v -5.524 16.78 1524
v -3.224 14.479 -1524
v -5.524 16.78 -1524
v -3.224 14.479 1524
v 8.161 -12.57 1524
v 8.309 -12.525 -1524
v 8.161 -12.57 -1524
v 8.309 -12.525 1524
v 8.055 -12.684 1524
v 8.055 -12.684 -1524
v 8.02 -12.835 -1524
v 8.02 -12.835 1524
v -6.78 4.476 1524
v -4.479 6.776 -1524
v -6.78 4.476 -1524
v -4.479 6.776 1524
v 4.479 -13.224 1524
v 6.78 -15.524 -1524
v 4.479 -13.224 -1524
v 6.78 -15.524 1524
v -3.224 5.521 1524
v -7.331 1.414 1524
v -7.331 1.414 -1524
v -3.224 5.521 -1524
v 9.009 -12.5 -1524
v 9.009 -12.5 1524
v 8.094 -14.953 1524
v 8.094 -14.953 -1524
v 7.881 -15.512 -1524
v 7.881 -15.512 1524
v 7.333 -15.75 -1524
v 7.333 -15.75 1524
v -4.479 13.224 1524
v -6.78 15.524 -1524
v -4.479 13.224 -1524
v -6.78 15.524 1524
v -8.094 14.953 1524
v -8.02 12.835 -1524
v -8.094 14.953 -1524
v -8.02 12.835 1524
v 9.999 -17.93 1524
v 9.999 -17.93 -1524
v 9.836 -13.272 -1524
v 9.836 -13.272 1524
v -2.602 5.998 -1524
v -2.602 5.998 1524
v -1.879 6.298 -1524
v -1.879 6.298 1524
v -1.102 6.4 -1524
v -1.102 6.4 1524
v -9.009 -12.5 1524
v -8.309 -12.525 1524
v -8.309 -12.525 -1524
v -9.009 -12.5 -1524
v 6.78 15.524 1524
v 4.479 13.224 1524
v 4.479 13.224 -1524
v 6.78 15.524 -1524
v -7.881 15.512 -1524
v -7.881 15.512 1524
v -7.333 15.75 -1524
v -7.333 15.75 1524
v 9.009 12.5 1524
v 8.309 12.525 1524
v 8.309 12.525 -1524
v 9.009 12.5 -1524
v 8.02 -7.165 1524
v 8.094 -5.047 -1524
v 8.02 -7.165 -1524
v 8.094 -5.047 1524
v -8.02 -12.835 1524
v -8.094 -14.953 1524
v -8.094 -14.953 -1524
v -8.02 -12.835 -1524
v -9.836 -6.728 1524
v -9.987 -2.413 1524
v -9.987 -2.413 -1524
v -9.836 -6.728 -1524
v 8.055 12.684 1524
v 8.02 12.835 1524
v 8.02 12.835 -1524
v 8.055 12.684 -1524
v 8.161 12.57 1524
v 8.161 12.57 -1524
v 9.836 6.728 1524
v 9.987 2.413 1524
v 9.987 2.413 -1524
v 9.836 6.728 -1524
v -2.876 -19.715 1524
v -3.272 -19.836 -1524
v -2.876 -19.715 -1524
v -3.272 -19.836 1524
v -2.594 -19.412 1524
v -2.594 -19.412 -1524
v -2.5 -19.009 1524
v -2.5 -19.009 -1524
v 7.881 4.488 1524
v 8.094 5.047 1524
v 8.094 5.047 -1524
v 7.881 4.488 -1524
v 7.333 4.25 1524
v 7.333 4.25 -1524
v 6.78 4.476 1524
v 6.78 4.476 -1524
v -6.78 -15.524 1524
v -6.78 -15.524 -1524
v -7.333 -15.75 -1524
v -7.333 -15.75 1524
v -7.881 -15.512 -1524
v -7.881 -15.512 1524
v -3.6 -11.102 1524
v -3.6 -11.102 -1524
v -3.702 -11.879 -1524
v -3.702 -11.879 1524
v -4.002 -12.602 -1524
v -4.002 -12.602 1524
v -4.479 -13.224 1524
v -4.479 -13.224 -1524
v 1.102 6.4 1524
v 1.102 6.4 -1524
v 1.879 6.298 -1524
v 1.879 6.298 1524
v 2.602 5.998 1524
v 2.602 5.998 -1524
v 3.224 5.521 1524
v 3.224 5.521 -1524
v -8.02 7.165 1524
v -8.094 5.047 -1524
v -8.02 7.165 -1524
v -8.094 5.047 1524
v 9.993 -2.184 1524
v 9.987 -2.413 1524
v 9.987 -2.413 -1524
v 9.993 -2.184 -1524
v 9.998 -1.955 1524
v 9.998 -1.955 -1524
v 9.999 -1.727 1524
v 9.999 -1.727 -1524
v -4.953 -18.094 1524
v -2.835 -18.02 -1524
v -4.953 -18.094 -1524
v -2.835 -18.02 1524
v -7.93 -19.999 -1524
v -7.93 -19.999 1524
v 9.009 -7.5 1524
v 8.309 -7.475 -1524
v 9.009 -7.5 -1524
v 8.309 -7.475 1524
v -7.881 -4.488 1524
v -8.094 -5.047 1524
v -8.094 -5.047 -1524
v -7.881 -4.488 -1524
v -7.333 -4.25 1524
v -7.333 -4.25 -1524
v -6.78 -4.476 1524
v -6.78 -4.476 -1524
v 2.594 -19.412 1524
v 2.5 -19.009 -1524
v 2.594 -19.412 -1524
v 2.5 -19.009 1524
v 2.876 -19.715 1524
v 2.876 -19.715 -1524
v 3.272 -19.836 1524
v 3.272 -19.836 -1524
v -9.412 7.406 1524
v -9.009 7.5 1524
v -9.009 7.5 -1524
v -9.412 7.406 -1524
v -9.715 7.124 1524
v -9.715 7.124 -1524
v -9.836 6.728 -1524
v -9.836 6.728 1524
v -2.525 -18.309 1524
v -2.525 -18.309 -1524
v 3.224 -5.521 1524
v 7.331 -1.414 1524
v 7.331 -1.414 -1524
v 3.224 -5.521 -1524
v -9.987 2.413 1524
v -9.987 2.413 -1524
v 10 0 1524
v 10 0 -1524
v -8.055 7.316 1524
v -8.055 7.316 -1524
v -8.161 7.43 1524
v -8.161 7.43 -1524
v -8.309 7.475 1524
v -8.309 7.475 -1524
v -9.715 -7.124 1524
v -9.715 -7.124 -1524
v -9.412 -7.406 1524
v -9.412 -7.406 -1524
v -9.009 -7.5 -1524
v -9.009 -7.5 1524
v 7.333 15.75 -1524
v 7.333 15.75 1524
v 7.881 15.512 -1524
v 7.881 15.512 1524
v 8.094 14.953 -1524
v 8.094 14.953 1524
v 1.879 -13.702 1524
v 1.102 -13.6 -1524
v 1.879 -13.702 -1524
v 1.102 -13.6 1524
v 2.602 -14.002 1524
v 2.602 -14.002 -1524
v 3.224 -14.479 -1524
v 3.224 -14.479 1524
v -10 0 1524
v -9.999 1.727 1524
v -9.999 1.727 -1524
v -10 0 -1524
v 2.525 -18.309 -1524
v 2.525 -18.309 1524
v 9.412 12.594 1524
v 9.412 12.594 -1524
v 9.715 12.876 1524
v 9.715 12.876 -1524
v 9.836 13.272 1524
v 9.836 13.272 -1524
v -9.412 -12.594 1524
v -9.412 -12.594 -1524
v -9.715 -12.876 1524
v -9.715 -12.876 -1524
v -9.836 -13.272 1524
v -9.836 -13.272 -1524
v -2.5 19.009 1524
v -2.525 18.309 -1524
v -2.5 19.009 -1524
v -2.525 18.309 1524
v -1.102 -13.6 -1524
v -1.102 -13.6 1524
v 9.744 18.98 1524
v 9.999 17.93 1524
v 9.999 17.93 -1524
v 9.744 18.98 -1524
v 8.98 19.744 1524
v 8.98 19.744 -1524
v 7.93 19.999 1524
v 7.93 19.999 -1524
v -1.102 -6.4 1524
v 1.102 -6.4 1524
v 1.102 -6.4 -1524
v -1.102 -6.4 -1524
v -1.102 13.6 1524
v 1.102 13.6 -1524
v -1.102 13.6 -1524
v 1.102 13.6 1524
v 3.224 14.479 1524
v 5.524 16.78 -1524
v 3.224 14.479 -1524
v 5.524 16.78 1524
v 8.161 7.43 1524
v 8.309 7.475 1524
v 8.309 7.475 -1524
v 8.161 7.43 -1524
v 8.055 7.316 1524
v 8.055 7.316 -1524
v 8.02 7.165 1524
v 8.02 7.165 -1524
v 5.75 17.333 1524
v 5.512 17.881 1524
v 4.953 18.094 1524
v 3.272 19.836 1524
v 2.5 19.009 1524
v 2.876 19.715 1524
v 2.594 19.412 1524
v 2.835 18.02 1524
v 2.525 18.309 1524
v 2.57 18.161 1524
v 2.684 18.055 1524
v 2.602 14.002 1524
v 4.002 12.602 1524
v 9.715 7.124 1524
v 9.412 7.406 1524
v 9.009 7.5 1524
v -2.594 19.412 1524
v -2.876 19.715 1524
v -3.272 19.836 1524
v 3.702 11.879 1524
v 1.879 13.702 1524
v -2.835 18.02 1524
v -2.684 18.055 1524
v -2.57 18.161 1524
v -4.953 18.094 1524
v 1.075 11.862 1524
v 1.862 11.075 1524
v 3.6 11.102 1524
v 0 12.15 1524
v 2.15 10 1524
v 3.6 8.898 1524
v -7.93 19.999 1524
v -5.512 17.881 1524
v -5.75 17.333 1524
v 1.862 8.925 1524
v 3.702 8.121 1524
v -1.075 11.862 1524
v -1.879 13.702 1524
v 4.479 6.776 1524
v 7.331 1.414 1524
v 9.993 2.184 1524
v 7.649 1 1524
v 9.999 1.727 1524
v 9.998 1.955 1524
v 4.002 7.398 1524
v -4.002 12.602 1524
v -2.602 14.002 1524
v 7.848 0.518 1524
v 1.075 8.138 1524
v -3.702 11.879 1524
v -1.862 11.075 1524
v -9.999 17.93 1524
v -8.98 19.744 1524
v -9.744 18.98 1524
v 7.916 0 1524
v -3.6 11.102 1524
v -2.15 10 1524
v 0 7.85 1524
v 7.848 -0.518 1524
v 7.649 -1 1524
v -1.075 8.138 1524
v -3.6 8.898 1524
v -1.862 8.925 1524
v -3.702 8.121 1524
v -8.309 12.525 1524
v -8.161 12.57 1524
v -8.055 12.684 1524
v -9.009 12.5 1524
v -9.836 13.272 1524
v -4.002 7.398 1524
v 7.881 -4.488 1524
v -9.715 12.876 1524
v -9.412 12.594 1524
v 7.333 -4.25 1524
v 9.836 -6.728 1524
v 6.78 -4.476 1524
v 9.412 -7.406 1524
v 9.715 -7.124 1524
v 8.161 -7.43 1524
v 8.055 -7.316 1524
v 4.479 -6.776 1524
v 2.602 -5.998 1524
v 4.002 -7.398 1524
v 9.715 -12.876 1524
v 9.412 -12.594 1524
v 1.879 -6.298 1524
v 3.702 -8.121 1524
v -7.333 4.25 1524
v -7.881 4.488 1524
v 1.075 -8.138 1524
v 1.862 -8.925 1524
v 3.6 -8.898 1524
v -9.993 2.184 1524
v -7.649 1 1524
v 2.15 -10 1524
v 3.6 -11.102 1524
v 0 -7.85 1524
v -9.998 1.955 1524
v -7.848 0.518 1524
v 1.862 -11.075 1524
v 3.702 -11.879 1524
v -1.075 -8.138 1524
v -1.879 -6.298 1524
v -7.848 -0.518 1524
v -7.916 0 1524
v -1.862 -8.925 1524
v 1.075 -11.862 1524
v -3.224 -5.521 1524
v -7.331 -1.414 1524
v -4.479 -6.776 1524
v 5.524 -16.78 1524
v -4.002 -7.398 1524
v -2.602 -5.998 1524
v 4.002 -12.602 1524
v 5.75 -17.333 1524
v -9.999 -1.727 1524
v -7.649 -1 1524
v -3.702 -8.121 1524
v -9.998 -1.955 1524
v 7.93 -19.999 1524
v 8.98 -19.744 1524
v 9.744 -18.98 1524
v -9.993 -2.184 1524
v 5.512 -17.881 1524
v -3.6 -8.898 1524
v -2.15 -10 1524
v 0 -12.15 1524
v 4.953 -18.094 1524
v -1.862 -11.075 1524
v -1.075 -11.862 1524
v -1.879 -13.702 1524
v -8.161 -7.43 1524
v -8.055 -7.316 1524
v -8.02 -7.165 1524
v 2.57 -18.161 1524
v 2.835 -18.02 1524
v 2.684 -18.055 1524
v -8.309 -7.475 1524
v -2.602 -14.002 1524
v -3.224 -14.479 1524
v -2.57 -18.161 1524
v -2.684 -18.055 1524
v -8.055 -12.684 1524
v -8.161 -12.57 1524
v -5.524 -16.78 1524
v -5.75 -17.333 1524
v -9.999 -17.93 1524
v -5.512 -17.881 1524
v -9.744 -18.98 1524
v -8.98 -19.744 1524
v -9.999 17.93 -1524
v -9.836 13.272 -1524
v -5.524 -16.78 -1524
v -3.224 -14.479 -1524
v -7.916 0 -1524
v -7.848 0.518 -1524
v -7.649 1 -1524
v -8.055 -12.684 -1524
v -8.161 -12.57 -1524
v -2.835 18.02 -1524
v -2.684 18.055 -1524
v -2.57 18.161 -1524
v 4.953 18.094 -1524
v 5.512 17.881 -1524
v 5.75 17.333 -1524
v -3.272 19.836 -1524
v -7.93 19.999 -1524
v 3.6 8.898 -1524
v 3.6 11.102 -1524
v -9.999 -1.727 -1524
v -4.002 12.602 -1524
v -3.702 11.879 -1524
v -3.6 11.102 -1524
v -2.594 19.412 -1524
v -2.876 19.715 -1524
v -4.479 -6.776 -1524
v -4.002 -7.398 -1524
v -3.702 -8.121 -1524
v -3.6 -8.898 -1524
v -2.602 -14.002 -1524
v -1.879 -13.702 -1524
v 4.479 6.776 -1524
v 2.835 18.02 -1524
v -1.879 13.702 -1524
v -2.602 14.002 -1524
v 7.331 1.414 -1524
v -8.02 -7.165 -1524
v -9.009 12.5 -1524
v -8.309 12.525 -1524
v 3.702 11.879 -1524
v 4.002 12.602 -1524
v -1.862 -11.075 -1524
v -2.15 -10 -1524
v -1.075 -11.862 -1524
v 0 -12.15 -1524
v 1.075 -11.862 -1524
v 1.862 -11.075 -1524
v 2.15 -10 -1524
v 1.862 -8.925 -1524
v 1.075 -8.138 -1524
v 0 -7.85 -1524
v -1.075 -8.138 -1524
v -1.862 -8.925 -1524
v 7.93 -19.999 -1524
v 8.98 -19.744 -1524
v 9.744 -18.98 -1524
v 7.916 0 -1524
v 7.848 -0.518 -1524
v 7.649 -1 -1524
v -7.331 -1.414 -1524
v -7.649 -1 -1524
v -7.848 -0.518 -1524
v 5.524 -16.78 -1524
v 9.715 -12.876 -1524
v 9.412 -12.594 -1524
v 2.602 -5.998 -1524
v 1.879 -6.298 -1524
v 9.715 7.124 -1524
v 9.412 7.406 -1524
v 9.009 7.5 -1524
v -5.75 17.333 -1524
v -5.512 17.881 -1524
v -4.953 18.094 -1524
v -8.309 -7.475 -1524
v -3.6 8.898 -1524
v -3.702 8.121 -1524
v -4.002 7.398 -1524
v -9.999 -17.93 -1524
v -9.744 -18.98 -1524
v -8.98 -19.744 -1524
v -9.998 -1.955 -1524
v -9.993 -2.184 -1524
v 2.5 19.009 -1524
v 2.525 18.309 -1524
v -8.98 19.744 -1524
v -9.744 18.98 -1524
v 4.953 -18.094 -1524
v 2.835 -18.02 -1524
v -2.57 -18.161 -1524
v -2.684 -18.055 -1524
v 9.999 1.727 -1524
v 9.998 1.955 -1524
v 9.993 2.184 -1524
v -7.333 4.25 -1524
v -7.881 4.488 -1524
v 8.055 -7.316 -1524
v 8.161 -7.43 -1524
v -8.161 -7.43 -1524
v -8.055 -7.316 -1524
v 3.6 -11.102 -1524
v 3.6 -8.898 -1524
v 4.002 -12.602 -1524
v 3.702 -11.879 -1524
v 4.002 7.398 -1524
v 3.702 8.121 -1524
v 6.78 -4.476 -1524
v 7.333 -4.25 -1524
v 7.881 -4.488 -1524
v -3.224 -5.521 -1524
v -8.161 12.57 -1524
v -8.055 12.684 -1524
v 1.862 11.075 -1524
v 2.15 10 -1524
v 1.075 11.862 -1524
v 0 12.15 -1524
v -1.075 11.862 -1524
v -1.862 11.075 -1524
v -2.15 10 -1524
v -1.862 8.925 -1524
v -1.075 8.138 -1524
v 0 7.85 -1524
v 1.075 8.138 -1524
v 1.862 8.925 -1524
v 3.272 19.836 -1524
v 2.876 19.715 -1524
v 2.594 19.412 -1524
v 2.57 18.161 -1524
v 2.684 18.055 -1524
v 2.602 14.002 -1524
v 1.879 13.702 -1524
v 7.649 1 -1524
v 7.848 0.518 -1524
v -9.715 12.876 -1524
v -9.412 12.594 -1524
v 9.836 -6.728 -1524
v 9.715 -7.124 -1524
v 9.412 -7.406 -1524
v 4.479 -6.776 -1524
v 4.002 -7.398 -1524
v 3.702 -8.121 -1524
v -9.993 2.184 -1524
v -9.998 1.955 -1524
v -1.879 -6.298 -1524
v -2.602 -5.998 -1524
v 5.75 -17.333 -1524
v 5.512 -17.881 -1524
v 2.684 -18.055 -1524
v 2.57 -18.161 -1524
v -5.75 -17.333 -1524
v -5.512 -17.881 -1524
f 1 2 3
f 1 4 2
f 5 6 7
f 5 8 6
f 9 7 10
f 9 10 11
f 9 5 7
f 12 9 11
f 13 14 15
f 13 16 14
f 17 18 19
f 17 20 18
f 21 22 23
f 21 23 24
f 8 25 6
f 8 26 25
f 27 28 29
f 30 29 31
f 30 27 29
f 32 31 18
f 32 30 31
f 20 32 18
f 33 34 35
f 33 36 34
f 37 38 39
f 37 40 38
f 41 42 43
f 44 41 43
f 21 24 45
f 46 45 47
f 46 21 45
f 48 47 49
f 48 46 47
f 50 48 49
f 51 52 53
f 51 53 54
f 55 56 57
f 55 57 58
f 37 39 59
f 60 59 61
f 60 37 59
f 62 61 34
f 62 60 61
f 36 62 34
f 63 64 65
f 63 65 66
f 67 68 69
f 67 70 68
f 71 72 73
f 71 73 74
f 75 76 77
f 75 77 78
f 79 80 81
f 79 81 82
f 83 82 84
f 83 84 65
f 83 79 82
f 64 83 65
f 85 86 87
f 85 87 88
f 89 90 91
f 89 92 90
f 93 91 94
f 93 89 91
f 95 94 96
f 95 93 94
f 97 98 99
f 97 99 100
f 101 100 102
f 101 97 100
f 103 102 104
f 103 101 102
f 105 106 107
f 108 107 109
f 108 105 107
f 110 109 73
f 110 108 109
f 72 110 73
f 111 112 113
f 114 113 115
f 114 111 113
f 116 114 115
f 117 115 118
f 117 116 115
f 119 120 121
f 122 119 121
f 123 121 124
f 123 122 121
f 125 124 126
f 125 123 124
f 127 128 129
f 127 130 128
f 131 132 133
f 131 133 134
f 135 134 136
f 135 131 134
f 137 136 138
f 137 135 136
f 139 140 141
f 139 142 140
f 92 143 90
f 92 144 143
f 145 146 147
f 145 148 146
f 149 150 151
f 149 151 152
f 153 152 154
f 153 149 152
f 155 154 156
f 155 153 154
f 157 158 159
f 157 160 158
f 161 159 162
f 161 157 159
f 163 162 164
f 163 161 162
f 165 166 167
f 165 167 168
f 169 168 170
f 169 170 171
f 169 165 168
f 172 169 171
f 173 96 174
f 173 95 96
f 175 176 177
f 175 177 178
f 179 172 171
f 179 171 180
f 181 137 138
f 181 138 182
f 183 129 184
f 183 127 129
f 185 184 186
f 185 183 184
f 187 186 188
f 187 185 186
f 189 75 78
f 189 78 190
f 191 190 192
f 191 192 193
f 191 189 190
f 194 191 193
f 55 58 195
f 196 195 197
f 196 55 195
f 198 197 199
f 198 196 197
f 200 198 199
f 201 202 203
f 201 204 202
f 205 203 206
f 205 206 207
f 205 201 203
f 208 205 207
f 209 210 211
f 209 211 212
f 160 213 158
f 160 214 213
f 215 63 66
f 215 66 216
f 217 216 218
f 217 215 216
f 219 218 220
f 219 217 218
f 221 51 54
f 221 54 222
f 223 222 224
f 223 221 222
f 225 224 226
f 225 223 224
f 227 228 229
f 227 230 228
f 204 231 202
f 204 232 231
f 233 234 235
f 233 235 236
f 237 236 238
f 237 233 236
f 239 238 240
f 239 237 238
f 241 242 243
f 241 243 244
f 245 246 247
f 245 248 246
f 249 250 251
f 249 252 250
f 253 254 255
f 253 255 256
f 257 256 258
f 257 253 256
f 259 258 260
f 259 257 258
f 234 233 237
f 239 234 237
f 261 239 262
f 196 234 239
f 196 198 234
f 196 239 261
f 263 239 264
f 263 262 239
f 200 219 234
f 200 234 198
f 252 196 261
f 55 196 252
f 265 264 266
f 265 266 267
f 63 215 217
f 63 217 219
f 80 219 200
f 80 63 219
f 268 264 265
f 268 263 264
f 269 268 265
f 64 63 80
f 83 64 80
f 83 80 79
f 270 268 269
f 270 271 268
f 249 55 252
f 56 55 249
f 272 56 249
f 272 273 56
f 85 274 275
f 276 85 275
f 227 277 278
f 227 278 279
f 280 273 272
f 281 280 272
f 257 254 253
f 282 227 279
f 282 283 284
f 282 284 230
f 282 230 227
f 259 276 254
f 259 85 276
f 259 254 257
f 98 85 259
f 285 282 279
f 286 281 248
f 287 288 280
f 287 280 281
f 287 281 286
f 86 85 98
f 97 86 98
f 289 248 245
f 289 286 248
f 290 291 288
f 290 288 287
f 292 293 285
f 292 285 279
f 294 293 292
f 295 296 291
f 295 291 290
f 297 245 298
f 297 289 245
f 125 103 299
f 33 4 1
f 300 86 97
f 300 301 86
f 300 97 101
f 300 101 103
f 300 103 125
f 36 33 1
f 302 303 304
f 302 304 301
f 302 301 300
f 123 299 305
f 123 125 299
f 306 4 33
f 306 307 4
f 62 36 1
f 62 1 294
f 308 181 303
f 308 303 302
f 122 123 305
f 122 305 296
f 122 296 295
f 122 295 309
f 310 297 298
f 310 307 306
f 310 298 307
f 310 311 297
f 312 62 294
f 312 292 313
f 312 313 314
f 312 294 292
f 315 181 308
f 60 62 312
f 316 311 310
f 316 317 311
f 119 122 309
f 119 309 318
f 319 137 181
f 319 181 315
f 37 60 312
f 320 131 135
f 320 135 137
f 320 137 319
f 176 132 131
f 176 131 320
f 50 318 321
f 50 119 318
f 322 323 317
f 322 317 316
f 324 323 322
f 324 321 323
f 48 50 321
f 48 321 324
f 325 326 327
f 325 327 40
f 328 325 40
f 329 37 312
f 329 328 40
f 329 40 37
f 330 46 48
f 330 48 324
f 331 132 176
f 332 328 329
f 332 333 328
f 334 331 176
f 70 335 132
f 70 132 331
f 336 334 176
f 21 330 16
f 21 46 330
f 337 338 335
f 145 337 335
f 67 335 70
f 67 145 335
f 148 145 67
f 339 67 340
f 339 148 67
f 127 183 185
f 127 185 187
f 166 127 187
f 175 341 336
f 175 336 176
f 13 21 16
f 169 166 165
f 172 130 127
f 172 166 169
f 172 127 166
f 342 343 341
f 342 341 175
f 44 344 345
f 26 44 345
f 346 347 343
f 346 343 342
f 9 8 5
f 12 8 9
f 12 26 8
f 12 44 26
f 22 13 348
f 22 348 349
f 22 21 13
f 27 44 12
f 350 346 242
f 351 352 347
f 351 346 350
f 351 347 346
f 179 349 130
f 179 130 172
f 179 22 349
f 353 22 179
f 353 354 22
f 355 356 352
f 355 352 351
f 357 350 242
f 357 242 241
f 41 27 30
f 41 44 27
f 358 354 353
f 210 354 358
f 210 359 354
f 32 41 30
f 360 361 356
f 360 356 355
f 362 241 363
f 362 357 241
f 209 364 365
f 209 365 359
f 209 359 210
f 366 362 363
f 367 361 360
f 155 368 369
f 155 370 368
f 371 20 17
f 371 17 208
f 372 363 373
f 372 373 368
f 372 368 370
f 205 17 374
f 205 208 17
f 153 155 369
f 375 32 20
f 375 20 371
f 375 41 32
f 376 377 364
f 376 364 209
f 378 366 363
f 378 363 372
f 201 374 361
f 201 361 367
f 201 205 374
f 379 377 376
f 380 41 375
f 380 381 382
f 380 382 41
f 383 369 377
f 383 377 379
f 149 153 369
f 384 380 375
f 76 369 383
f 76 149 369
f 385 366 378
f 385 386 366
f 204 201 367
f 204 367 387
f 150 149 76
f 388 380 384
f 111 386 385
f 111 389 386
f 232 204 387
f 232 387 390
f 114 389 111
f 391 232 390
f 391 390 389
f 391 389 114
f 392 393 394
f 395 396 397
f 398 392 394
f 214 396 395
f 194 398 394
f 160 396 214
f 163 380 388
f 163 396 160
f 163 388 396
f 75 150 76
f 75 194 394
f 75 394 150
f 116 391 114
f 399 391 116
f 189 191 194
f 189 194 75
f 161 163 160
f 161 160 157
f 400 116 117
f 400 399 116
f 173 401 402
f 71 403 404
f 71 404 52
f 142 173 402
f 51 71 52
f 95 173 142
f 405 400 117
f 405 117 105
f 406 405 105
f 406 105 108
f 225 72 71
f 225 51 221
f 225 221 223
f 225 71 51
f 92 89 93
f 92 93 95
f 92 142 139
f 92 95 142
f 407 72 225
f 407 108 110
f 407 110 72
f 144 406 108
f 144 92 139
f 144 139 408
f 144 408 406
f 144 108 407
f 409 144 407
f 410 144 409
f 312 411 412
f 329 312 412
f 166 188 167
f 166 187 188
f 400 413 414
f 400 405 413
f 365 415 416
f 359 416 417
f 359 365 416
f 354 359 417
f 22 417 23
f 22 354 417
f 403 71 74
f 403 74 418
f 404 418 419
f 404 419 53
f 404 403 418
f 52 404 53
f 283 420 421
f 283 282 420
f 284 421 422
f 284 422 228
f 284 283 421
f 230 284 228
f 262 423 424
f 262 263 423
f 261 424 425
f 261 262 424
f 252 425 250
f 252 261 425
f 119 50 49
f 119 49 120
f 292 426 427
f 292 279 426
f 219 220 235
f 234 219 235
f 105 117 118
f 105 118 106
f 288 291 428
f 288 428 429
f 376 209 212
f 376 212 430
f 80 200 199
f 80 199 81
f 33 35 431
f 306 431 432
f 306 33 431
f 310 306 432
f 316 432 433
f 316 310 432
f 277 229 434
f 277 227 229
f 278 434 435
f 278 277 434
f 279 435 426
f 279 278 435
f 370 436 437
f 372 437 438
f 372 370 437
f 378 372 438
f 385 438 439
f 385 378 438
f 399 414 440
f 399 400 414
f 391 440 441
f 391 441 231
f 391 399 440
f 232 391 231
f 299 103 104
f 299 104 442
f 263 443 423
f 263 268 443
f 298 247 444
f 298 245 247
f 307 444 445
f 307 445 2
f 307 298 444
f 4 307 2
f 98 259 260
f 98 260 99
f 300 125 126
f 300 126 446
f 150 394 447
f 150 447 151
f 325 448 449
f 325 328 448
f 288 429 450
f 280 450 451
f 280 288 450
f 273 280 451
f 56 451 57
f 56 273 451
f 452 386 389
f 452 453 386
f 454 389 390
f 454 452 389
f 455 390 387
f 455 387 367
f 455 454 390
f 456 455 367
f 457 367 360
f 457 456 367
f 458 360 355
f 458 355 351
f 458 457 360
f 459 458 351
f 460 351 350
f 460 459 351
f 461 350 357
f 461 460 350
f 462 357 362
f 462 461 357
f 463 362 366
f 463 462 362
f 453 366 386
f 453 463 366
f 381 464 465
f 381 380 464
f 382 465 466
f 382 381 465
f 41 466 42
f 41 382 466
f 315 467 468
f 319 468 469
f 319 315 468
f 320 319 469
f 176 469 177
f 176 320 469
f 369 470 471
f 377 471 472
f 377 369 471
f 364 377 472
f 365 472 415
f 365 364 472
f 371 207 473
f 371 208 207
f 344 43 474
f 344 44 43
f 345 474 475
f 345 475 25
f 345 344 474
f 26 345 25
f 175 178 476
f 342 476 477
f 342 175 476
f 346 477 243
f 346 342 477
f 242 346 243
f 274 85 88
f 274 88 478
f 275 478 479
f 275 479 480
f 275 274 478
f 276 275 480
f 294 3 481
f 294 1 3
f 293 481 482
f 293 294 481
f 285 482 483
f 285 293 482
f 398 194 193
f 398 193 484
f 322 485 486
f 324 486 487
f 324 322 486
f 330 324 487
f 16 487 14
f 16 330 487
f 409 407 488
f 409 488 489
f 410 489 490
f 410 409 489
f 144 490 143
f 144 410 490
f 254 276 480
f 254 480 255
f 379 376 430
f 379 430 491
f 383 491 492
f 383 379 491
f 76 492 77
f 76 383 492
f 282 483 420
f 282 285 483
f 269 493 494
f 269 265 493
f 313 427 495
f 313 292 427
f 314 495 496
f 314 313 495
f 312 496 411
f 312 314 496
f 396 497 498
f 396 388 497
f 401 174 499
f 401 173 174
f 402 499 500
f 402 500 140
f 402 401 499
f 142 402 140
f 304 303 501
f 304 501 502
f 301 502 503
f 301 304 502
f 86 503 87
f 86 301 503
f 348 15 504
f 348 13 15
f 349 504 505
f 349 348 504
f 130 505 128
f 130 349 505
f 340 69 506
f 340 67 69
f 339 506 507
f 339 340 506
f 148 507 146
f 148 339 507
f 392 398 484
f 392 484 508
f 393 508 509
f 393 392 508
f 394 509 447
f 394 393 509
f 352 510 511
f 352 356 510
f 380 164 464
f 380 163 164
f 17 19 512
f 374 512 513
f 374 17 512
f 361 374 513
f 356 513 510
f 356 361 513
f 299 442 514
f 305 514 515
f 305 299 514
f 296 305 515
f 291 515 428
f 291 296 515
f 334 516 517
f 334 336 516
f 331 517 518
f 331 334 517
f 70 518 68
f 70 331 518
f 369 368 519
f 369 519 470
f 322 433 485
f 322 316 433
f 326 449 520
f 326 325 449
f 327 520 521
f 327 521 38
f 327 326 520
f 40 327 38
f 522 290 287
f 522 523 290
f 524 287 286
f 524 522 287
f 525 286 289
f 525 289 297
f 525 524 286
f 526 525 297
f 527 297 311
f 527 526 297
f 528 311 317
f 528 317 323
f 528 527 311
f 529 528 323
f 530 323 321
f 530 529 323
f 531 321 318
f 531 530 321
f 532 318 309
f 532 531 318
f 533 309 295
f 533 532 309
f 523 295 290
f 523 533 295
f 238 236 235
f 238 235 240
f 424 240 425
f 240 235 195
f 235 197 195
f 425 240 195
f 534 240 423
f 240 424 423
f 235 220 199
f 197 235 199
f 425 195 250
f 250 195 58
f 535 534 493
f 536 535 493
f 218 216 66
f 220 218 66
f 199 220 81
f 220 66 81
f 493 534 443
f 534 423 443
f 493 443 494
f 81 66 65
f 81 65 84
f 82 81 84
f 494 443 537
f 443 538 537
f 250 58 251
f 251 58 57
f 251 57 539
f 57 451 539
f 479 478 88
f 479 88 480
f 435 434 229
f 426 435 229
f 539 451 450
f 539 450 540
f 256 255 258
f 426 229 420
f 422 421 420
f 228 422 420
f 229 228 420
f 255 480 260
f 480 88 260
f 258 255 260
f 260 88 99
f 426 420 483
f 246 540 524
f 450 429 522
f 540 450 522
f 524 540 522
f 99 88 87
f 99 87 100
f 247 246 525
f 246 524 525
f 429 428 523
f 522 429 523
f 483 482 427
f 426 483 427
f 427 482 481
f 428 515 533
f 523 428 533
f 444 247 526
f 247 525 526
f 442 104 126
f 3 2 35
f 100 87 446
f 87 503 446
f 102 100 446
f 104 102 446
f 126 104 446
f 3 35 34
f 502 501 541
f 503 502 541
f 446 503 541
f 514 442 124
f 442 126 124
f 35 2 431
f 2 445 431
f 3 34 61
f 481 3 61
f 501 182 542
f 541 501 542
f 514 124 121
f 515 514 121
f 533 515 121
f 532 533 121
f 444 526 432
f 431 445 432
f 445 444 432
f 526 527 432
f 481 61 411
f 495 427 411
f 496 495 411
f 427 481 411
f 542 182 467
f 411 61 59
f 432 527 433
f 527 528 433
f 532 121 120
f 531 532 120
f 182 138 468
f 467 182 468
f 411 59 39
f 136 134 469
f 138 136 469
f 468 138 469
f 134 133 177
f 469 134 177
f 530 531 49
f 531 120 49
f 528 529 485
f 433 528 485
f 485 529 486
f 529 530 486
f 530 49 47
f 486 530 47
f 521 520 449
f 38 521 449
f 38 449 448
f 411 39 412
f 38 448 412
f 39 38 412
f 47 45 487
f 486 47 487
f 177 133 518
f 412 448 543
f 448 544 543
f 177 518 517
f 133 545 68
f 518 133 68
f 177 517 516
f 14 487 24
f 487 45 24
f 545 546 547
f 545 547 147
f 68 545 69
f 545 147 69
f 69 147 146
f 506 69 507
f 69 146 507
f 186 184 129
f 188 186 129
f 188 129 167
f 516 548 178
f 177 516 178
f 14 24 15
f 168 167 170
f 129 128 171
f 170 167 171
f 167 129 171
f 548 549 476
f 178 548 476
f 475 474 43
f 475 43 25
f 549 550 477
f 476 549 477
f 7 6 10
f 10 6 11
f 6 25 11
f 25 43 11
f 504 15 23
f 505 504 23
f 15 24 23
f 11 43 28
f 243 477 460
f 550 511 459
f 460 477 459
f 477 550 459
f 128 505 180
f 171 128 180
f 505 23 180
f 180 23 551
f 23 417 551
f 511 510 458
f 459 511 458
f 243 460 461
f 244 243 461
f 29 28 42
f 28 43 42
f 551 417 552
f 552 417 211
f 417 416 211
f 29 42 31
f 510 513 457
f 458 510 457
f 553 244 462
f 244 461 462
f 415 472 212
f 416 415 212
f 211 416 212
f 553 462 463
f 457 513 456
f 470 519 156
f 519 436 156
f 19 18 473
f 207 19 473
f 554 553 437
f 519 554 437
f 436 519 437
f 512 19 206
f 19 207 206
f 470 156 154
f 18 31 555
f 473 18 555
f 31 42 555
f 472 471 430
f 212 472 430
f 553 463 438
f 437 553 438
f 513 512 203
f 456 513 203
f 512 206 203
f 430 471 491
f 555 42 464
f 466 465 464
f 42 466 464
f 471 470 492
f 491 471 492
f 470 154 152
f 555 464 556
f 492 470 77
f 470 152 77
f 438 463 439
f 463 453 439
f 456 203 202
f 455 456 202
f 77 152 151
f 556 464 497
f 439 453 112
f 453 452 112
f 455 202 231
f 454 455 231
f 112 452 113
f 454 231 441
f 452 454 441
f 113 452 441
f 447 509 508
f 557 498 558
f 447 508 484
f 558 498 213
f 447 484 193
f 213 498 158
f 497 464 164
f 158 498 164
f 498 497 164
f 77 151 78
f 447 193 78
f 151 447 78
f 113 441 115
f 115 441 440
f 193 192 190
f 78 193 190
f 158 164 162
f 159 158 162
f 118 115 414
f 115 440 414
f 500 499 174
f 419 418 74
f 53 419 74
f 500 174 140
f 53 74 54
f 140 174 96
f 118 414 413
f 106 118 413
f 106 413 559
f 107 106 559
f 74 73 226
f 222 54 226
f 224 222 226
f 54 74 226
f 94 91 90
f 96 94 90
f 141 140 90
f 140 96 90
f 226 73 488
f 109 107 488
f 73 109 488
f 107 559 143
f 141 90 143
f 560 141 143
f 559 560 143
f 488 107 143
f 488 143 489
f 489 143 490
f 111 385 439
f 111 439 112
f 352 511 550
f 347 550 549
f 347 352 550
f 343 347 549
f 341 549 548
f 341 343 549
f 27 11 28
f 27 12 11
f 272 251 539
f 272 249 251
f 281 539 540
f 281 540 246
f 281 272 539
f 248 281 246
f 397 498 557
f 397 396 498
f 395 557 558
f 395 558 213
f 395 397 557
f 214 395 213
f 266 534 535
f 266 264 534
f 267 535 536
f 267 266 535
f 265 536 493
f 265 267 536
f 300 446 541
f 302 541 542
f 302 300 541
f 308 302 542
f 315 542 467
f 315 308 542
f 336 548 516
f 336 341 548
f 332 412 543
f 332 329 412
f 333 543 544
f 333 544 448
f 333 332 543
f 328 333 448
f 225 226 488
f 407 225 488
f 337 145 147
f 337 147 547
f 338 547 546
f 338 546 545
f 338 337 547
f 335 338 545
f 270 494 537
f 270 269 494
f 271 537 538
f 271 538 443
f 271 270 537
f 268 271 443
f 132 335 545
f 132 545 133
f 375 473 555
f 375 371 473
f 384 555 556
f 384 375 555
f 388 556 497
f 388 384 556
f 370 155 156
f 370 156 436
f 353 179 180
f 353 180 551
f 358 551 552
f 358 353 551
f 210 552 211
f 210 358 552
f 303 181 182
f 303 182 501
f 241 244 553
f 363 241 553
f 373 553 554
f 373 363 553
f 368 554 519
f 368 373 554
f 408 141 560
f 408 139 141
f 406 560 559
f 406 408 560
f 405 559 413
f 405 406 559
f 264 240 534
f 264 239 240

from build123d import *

# Parameters (mm, degrees)
SKETCH3_R           = 2.15
BOSS_EXTRUDE1_DEPTH = 1524
CIRPATTERN1_COUNT   = 2


with BuildPart() as part:
    # Sketch3 → Boss-Extrude1 (new, symmetric)
    with BuildSketch(Plane.XY):
        with BuildLine():
            Line((-8.30911066, 7.475083014), (-9.008684239, 7.499512662))
            ThreePointArc((-9.008684239, 7.499512662), (-9.582202525, 7.285082961), (-9.836116498, 6.727919597))
            Line((-9.836116498, 6.727919597), (-9.986803685, 2.412803152))
            ThreePointArc((-9.986803685, 2.412803152), (-9.995837451, 2.069746735), (-9.99898368, 1.726585818))
            Line((-9.99898368, 1.726585818), (-10, 0))
            Line((-10, 0), (-7.916458339, 0))
            ThreePointArc((-7.916458339, 0), (-7.764217404, 0.765366865), (-7.330671901, 1.414213562))
            Line((-7.330671901, 1.414213562), (-3.22356512, 5.521320344))
            ThreePointArc((-3.22356512, 5.521320344), (-2.250295073, 6.171638598), (-1.102244776, 6.4))
            Line((-1.102244776, 6.4), (1.102244776, 6.4))
            ThreePointArc((1.102244776, 6.4), (2.250295073, 6.171638598), (3.22356512, 5.521320344))
            Line((3.22356512, 5.521320344), (7.330671901, 1.414213562))
            ThreePointArc((7.330671901, 1.414213562), (7.764217404, 0.765366865), (7.916458339, 0))
            Line((7.916458339, 0), (10, 0))
            Line((10, 0), (9.99898368, 1.726585818))
            ThreePointArc((9.99898368, 1.726585818), (9.995837451, 2.069746735), (9.986803685, 2.412803152))
            Line((9.986803685, 2.412803152), (9.836116498, 6.727919597))
            ThreePointArc((9.836116498, 6.727919597), (9.582202525, 7.285082961), (9.008684239, 7.499512662))
            Line((9.008684239, 7.499512662), (8.30911066, 7.475083014))
            ThreePointArc((8.30911066, 7.475083014), (8.100174399, 7.379865274), (8.019763261, 7.164795917))
            Line((8.019763261, 7.164795917), (8.093719461, 5.046967452))
            ThreePointArc((8.093719461, 5.046967452), (7.631170264, 4.313871343), (6.779559917, 4.47555462))
            Line((6.779559917, 4.47555462), (4.478679656, 6.77643488))
            ThreePointArc((4.478679656, 6.77643488), (3.828361402, 7.749704927), (3.6, 8.897755224))
            Line((3.6, 8.897755224), (3.6, 11.102244776))
            ThreePointArc((3.6, 11.102244776), (3.828361402, 12.250295073), (4.478679656, 13.22356512))
            Line((4.478679656, 13.22356512), (6.779559917, 15.52444538))
            ThreePointArc((6.779559917, 15.52444538), (7.631170264, 15.686128657), (8.093719461, 14.953032548))
            Line((8.093719461, 14.953032548), (8.019763261, 12.835204083))
            ThreePointArc((8.019763261, 12.835204083), (8.100174399, 12.620134726), (8.30911066, 12.524916986))
            Line((8.30911066, 12.524916986), (9.008684239, 12.500487338))
            ThreePointArc((9.008684239, 12.500487338), (9.582202525, 12.714917039), (9.836116498, 13.272080403))
            Line((9.836116498, 13.272080403), (9.998781654, 17.930201007))
            ThreePointArc((9.998781654, 17.930201007), (9.414213562, 19.414213562), (7.930201007, 19.998781654))
            Line((7.930201007, 19.998781654), (3.272080403, 19.836116498))
            ThreePointArc((3.272080403, 19.836116498), (2.714917039, 19.582202525), (2.500487338, 19.008684239))
            Line((2.500487338, 19.008684239), (2.524916986, 18.30911066))
            ThreePointArc((2.524916986, 18.30911066), (2.620134726, 18.100174399), (2.835204083, 18.019763261))
            Line((2.835204083, 18.019763261), (4.953032548, 18.093719461))
            ThreePointArc((4.953032548, 18.093719461), (5.686128657, 17.631170264), (5.52444538, 16.779559917))
            Line((5.52444538, 16.779559917), (3.22356512, 14.478679656))
            ThreePointArc((3.22356512, 14.478679656), (2.250295073, 13.828361402), (1.102244776, 13.6))
            Line((1.102244776, 13.6), (-1.102244776, 13.6))
            ThreePointArc((-1.102244776, 13.6), (-2.250295073, 13.828361402), (-3.22356512, 14.478679656))
            Line((-3.22356512, 14.478679656), (-5.52444538, 16.779559917))
            ThreePointArc((-5.52444538, 16.779559917), (-5.686128657, 17.631170264), (-4.953032548, 18.093719461))
            Line((-4.953032548, 18.093719461), (-2.835204083, 18.019763261))
            ThreePointArc((-2.835204083, 18.019763261), (-2.620134726, 18.100174399), (-2.524916986, 18.30911066))
            Line((-2.524916986, 18.30911066), (-2.500487338, 19.008684239))
            ThreePointArc((-2.500487338, 19.008684239), (-2.714917039, 19.582202525), (-3.272080403, 19.836116498))
            Line((-3.272080403, 19.836116498), (-7.930201007, 19.998781654))
            ThreePointArc((-7.930201007, 19.998781654), (-9.414213562, 19.414213562), (-9.998781654, 17.930201007))
            Line((-9.998781654, 17.930201007), (-9.836116498, 13.272080403))
            ThreePointArc((-9.836116498, 13.272080403), (-9.582202525, 12.714917039), (-9.008684239, 12.500487338))
            Line((-9.008684239, 12.500487338), (-8.30911066, 12.524916986))
            ThreePointArc((-8.30911066, 12.524916986), (-8.100174399, 12.620134726), (-8.019763261, 12.835204083))
            Line((-8.019763261, 12.835204083), (-8.093719461, 14.953032548))
            ThreePointArc((-8.093719461, 14.953032548), (-7.631170264, 15.686128657), (-6.779559917, 15.52444538))
            Line((-6.779559917, 15.52444538), (-4.478679656, 13.22356512))
            ThreePointArc((-4.478679656, 13.22356512), (-3.828361402, 12.250295073), (-3.6, 11.102244776))
            Line((-3.6, 11.102244776), (-3.6, 8.897755224))
            ThreePointArc((-3.6, 8.897755224), (-3.828361402, 7.749704927), (-4.478679656, 6.77643488))
            Line((-4.478679656, 6.77643488), (-6.779559917, 4.47555462))
            ThreePointArc((-6.779559917, 4.47555462), (-7.631170264, 4.313871343), (-8.093719461, 5.046967452))
            Line((-8.093719461, 5.046967452), (-8.019763261, 7.164795917))
            ThreePointArc((-8.019763261, 7.164795917), (-8.100174399, 7.379865274), (-8.30911066, 7.475083014))
        make_face()
        with Locations((0, 10)):
            Circle(SKETCH3_R, mode=Mode.SUBTRACT)
    boss_extrude1 = extrude(amount=BOSS_EXTRUDE1_DEPTH, both=True)

    # CirPattern1: Boss-Extrude1 ×2 about axis
    cirpattern1_axis = Axis((0, 0, 0), (0, 0, 1))
    for i in range(1, CIRPATTERN1_COUNT):
        add(boss_extrude1.rotate(cirpattern1_axis, i * 360 / CIRPATTERN1_COUNT))


solid = part.part
